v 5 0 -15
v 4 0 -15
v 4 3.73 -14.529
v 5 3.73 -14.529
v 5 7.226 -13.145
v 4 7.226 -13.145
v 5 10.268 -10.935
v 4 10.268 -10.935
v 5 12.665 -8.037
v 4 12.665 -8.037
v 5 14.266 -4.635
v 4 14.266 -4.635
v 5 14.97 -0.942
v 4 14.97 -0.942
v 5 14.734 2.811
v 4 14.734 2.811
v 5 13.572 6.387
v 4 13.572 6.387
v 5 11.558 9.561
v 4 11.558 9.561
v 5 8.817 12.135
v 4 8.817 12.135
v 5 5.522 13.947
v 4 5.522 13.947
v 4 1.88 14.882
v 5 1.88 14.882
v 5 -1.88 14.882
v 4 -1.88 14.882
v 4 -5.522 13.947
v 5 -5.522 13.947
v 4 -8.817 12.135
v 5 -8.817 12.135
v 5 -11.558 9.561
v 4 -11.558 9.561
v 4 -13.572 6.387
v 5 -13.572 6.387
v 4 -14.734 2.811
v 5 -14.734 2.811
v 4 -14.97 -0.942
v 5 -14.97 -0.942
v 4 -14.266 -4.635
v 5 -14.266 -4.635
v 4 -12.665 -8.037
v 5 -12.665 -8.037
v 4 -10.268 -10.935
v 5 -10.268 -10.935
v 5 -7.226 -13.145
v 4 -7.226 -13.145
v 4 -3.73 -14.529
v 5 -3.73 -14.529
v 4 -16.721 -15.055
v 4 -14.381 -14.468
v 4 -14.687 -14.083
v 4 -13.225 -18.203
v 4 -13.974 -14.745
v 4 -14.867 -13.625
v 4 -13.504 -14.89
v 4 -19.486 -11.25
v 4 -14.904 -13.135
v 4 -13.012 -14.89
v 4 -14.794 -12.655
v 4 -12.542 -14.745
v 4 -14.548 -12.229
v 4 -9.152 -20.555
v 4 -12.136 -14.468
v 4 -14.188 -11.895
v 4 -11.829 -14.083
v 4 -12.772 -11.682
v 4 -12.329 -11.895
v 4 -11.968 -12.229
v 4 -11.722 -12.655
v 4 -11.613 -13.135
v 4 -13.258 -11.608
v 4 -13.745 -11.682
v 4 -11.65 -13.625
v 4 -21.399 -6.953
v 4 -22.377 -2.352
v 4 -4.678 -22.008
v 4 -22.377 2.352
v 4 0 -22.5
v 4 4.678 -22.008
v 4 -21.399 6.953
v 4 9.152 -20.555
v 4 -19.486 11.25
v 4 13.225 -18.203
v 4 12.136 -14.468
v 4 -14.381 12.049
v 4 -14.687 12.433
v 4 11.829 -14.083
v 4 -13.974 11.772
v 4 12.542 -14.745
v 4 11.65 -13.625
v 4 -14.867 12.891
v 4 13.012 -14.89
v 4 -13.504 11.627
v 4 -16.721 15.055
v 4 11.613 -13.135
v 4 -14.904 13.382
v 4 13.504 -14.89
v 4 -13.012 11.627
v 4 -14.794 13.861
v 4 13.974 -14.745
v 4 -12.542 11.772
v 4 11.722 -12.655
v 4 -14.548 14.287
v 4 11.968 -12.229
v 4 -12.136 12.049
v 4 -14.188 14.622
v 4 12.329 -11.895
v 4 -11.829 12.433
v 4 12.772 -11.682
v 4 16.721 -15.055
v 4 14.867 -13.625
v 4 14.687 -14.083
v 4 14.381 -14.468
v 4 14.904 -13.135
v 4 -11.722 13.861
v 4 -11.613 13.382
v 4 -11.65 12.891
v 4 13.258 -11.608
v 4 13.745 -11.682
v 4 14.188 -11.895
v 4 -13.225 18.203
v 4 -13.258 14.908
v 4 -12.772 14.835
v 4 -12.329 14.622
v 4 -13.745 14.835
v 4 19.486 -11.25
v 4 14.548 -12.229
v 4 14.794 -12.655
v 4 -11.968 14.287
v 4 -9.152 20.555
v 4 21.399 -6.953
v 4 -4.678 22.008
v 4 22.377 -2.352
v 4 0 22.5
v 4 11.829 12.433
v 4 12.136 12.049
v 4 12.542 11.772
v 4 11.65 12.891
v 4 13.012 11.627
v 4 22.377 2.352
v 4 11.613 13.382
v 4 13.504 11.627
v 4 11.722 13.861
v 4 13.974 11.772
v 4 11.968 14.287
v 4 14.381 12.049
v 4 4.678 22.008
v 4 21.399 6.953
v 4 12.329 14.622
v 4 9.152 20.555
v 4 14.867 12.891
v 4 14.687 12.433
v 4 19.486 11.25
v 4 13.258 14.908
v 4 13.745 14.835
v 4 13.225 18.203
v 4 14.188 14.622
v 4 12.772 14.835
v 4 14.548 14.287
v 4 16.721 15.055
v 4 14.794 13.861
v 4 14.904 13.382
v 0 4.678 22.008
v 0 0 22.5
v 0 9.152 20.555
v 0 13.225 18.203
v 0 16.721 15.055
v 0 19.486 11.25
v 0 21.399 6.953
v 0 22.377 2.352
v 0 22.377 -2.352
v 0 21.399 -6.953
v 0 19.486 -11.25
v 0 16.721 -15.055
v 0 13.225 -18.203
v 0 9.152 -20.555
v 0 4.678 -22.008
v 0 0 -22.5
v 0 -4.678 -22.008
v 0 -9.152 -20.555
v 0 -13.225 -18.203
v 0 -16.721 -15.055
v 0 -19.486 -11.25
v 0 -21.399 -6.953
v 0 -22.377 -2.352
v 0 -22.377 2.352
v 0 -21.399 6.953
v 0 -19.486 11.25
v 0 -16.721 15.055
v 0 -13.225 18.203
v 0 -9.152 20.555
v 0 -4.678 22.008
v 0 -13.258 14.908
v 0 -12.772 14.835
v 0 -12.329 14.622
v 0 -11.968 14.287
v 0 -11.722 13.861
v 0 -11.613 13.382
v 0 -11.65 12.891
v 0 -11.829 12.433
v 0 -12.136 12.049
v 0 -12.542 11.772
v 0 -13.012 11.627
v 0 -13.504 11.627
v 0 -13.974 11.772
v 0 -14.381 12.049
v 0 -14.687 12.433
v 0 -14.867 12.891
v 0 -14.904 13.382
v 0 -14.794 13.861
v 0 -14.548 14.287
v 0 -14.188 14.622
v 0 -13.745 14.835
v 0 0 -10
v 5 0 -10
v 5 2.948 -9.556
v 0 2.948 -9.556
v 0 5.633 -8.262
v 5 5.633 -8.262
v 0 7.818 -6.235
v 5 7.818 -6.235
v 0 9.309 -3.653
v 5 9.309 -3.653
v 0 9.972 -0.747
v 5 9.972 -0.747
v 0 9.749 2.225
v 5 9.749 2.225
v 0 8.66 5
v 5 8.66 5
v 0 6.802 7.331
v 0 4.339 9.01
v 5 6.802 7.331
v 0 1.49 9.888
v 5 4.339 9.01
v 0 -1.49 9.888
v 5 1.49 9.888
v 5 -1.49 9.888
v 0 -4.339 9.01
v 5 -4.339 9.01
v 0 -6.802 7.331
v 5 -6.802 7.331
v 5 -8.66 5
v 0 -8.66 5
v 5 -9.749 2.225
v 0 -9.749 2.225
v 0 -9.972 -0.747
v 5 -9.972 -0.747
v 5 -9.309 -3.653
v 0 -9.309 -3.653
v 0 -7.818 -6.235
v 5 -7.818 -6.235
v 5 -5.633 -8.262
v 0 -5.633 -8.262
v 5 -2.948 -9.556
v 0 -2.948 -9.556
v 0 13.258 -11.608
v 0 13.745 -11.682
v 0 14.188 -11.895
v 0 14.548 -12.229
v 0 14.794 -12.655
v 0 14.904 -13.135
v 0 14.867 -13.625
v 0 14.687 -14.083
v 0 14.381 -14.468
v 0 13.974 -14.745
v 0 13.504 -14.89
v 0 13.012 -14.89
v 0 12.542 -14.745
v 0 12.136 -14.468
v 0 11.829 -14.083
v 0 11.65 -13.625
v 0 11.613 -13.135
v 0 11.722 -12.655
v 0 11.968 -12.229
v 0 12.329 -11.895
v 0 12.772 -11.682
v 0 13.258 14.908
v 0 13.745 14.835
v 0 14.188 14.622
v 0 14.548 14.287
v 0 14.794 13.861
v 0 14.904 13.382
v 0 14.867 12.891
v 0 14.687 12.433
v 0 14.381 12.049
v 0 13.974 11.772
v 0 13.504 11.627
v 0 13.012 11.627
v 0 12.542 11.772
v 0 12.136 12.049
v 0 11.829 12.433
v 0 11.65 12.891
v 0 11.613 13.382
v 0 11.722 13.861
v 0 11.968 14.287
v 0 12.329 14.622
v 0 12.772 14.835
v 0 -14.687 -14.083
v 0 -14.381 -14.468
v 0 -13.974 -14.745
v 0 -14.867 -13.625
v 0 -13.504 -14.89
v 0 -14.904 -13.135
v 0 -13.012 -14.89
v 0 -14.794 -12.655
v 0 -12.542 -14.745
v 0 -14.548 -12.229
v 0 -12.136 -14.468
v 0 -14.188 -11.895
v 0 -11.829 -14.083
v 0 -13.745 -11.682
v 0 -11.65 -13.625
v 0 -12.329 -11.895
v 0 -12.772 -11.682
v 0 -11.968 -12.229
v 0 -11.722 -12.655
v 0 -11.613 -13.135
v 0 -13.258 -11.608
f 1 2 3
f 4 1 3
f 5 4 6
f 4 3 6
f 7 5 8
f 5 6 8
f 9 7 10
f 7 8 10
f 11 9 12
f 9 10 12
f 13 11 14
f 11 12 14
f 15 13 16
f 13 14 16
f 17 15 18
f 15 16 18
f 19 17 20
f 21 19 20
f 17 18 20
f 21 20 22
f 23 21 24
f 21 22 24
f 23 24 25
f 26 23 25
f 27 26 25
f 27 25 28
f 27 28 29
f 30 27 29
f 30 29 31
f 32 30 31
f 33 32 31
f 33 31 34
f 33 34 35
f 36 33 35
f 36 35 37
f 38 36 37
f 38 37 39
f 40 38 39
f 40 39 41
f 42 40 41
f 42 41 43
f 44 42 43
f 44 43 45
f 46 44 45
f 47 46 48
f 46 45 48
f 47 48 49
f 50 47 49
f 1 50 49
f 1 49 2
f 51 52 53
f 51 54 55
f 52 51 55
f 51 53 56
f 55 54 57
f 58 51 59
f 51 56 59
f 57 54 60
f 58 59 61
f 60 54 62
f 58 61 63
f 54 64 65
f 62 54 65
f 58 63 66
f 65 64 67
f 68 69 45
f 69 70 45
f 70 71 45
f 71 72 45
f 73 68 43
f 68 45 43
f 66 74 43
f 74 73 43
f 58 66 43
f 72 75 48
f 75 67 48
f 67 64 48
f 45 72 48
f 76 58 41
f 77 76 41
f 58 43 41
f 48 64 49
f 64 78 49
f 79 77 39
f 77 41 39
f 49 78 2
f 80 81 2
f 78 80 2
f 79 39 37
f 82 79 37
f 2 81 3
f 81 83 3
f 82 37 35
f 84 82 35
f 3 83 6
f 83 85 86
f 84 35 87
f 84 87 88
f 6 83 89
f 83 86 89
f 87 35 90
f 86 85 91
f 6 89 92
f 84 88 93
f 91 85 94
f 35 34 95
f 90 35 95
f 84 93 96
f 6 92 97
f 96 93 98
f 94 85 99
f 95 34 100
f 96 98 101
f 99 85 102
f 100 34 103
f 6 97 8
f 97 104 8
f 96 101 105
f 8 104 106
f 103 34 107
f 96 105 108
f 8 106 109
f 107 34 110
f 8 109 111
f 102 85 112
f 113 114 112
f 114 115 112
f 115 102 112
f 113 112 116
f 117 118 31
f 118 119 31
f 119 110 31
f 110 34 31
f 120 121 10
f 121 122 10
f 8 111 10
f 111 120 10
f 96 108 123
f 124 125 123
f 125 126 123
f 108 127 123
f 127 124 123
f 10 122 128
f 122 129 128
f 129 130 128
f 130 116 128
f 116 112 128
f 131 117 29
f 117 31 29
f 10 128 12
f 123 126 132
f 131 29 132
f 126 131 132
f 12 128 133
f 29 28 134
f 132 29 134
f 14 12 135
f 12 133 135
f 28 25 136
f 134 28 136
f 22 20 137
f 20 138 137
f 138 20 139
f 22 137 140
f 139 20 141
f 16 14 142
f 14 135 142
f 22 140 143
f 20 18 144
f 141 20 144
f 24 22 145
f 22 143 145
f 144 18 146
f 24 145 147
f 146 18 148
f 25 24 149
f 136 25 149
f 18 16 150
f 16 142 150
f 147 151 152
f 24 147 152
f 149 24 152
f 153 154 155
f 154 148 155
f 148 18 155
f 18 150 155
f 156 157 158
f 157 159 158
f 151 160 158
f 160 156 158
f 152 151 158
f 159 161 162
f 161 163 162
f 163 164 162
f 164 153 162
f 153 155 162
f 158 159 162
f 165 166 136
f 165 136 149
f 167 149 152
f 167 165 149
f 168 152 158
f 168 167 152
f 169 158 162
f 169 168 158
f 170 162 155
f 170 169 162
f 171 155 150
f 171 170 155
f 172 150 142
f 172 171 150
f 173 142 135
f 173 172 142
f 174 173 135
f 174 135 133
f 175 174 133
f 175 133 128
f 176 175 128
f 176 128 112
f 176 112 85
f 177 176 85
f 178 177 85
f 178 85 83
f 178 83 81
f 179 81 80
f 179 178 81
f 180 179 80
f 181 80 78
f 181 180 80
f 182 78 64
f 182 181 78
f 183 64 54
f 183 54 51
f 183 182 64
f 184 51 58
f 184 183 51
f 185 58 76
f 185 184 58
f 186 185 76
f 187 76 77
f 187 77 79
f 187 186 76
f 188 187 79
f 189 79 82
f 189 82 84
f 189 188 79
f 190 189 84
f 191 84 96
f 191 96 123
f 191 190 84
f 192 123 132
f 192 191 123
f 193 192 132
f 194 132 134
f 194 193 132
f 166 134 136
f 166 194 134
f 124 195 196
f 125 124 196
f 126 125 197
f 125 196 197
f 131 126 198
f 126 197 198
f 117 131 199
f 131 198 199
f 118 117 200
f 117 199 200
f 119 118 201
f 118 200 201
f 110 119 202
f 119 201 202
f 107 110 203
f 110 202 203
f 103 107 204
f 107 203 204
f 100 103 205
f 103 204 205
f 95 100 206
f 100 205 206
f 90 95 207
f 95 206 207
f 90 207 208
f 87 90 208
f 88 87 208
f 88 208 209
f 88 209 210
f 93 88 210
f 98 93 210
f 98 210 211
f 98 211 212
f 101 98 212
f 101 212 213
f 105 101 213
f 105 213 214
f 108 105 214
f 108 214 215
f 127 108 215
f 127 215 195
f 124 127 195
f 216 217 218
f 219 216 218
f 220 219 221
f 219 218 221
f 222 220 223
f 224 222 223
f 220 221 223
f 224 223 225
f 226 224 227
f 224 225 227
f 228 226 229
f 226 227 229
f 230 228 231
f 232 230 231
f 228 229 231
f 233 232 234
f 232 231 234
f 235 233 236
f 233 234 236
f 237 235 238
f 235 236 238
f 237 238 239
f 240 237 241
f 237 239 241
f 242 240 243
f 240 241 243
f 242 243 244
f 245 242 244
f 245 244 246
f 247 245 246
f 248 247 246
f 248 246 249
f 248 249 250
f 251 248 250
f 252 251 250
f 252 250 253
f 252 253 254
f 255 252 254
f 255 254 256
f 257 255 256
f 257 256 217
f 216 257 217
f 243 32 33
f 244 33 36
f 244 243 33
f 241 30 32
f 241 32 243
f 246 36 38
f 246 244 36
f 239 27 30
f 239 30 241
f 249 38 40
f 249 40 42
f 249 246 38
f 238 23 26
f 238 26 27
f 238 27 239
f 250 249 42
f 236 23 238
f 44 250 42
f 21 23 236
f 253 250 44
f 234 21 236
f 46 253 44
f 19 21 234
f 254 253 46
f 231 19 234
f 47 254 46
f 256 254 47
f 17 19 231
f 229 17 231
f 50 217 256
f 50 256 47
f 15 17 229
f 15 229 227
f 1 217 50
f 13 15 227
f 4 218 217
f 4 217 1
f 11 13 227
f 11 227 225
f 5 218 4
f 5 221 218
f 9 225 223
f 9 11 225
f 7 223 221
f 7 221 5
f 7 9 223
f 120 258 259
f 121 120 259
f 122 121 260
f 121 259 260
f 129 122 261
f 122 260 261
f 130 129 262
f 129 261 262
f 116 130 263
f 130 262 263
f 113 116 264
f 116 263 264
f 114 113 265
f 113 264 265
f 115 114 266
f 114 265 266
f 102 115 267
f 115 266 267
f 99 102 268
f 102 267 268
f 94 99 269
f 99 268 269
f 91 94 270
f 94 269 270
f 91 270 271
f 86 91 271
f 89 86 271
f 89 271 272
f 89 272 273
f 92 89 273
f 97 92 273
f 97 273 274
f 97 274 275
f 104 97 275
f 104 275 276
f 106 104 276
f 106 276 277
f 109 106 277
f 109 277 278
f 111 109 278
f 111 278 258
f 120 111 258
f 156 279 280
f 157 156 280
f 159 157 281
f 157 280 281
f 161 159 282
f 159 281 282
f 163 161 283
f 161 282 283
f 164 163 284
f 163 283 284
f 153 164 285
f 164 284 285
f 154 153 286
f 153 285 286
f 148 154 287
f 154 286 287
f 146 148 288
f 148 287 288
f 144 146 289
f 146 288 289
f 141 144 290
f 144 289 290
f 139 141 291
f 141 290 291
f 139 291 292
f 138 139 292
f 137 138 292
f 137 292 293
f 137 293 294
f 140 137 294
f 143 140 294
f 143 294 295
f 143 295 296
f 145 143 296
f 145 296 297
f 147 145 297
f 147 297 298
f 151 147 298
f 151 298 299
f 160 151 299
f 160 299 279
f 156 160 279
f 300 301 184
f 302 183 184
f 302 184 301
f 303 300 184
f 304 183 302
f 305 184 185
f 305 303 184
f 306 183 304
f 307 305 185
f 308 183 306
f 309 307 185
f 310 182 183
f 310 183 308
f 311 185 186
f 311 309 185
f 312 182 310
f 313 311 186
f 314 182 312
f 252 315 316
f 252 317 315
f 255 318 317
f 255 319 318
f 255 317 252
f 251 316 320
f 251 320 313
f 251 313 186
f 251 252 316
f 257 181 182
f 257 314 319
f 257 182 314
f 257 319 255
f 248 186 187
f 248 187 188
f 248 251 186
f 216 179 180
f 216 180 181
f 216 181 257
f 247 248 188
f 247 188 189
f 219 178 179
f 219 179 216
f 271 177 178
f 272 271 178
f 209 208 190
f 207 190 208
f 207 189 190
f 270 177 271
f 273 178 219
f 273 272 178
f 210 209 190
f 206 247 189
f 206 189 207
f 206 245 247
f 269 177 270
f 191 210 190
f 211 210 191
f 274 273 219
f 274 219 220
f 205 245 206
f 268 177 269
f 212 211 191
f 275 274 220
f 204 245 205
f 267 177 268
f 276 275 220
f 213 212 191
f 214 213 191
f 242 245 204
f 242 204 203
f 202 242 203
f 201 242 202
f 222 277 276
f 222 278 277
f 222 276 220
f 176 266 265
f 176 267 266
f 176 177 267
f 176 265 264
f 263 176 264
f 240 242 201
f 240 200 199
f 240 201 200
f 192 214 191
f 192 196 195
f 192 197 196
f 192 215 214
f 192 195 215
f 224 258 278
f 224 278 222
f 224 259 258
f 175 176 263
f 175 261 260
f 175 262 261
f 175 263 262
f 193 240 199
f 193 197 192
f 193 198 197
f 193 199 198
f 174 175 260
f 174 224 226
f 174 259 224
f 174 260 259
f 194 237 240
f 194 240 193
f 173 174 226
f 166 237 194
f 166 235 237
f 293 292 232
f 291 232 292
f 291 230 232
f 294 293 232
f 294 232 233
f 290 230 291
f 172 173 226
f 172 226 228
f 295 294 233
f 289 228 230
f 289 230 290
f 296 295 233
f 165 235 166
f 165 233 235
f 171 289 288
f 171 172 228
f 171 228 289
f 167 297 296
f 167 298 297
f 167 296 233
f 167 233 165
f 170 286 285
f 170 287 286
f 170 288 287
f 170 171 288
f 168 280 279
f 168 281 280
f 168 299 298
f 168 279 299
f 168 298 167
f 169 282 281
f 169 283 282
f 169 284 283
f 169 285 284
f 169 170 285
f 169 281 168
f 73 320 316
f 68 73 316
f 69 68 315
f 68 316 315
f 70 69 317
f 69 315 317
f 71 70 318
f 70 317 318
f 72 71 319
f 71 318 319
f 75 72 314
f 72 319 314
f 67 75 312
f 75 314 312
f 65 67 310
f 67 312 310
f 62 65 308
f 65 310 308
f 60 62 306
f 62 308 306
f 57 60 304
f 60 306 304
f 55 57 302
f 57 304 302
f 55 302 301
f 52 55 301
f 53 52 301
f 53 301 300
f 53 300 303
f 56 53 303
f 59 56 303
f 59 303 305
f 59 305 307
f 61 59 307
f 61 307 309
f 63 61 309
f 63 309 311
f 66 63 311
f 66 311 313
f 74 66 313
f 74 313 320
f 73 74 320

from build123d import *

# Parameters (mm, degrees)
SKETCH_1_R          = 15
EXTRUDE_1_DEPTH     = 5
SKETCH_3_R          = 22.5
EXTRUDE_3_DEPTH     = 4
SKETCH_6_R          = 10
CUT_EXTRUDE_2_DEPTH = 33.210246817
HOLE_WIZARD_M4_1_D  = 3.3


with BuildPart() as part:
    # 草图1 → 凸台-拉伸1 (new body)
    with BuildSketch(Plane(origin=(0, 0, 0), x_dir=(0, 0, -1), z_dir=(1, 0, 0))):
        Circle(SKETCH_1_R)
    extrude(amount=EXTRUDE_1_DEPTH)

    # 草图3 → 凸台-拉伸3 (add)
    with BuildSketch(Plane.ZY):
        Circle(SKETCH_3_R)
    extrude(amount=-EXTRUDE_3_DEPTH)

    # 草图6 → 切除-拉伸2 (cut, through all)
    with BuildSketch(Plane(origin=(5, 0, 0), x_dir=(0, 0, -1), z_dir=(1, 0, 0))):
        Circle(SKETCH_6_R)
    extrude(amount=-CUT_EXTRUDE_2_DEPTH, mode=Mode.SUBTRACT)

    # M4 螺纹孔1 (through all)
    with Locations(Plane(origin=(4, 0, 0), x_dir=(0, 0, -1), z_dir=(1, 0, 0))):
        with Locations((-13.258252147, 13.258252147), (13.258252147, 13.258252147), (13.258252147, -13.258252147), (-13.258252147, -13.258252147), (0, 0)):
            Hole(HOLE_WIZARD_M4_1_D / 2)


solid = part.part
